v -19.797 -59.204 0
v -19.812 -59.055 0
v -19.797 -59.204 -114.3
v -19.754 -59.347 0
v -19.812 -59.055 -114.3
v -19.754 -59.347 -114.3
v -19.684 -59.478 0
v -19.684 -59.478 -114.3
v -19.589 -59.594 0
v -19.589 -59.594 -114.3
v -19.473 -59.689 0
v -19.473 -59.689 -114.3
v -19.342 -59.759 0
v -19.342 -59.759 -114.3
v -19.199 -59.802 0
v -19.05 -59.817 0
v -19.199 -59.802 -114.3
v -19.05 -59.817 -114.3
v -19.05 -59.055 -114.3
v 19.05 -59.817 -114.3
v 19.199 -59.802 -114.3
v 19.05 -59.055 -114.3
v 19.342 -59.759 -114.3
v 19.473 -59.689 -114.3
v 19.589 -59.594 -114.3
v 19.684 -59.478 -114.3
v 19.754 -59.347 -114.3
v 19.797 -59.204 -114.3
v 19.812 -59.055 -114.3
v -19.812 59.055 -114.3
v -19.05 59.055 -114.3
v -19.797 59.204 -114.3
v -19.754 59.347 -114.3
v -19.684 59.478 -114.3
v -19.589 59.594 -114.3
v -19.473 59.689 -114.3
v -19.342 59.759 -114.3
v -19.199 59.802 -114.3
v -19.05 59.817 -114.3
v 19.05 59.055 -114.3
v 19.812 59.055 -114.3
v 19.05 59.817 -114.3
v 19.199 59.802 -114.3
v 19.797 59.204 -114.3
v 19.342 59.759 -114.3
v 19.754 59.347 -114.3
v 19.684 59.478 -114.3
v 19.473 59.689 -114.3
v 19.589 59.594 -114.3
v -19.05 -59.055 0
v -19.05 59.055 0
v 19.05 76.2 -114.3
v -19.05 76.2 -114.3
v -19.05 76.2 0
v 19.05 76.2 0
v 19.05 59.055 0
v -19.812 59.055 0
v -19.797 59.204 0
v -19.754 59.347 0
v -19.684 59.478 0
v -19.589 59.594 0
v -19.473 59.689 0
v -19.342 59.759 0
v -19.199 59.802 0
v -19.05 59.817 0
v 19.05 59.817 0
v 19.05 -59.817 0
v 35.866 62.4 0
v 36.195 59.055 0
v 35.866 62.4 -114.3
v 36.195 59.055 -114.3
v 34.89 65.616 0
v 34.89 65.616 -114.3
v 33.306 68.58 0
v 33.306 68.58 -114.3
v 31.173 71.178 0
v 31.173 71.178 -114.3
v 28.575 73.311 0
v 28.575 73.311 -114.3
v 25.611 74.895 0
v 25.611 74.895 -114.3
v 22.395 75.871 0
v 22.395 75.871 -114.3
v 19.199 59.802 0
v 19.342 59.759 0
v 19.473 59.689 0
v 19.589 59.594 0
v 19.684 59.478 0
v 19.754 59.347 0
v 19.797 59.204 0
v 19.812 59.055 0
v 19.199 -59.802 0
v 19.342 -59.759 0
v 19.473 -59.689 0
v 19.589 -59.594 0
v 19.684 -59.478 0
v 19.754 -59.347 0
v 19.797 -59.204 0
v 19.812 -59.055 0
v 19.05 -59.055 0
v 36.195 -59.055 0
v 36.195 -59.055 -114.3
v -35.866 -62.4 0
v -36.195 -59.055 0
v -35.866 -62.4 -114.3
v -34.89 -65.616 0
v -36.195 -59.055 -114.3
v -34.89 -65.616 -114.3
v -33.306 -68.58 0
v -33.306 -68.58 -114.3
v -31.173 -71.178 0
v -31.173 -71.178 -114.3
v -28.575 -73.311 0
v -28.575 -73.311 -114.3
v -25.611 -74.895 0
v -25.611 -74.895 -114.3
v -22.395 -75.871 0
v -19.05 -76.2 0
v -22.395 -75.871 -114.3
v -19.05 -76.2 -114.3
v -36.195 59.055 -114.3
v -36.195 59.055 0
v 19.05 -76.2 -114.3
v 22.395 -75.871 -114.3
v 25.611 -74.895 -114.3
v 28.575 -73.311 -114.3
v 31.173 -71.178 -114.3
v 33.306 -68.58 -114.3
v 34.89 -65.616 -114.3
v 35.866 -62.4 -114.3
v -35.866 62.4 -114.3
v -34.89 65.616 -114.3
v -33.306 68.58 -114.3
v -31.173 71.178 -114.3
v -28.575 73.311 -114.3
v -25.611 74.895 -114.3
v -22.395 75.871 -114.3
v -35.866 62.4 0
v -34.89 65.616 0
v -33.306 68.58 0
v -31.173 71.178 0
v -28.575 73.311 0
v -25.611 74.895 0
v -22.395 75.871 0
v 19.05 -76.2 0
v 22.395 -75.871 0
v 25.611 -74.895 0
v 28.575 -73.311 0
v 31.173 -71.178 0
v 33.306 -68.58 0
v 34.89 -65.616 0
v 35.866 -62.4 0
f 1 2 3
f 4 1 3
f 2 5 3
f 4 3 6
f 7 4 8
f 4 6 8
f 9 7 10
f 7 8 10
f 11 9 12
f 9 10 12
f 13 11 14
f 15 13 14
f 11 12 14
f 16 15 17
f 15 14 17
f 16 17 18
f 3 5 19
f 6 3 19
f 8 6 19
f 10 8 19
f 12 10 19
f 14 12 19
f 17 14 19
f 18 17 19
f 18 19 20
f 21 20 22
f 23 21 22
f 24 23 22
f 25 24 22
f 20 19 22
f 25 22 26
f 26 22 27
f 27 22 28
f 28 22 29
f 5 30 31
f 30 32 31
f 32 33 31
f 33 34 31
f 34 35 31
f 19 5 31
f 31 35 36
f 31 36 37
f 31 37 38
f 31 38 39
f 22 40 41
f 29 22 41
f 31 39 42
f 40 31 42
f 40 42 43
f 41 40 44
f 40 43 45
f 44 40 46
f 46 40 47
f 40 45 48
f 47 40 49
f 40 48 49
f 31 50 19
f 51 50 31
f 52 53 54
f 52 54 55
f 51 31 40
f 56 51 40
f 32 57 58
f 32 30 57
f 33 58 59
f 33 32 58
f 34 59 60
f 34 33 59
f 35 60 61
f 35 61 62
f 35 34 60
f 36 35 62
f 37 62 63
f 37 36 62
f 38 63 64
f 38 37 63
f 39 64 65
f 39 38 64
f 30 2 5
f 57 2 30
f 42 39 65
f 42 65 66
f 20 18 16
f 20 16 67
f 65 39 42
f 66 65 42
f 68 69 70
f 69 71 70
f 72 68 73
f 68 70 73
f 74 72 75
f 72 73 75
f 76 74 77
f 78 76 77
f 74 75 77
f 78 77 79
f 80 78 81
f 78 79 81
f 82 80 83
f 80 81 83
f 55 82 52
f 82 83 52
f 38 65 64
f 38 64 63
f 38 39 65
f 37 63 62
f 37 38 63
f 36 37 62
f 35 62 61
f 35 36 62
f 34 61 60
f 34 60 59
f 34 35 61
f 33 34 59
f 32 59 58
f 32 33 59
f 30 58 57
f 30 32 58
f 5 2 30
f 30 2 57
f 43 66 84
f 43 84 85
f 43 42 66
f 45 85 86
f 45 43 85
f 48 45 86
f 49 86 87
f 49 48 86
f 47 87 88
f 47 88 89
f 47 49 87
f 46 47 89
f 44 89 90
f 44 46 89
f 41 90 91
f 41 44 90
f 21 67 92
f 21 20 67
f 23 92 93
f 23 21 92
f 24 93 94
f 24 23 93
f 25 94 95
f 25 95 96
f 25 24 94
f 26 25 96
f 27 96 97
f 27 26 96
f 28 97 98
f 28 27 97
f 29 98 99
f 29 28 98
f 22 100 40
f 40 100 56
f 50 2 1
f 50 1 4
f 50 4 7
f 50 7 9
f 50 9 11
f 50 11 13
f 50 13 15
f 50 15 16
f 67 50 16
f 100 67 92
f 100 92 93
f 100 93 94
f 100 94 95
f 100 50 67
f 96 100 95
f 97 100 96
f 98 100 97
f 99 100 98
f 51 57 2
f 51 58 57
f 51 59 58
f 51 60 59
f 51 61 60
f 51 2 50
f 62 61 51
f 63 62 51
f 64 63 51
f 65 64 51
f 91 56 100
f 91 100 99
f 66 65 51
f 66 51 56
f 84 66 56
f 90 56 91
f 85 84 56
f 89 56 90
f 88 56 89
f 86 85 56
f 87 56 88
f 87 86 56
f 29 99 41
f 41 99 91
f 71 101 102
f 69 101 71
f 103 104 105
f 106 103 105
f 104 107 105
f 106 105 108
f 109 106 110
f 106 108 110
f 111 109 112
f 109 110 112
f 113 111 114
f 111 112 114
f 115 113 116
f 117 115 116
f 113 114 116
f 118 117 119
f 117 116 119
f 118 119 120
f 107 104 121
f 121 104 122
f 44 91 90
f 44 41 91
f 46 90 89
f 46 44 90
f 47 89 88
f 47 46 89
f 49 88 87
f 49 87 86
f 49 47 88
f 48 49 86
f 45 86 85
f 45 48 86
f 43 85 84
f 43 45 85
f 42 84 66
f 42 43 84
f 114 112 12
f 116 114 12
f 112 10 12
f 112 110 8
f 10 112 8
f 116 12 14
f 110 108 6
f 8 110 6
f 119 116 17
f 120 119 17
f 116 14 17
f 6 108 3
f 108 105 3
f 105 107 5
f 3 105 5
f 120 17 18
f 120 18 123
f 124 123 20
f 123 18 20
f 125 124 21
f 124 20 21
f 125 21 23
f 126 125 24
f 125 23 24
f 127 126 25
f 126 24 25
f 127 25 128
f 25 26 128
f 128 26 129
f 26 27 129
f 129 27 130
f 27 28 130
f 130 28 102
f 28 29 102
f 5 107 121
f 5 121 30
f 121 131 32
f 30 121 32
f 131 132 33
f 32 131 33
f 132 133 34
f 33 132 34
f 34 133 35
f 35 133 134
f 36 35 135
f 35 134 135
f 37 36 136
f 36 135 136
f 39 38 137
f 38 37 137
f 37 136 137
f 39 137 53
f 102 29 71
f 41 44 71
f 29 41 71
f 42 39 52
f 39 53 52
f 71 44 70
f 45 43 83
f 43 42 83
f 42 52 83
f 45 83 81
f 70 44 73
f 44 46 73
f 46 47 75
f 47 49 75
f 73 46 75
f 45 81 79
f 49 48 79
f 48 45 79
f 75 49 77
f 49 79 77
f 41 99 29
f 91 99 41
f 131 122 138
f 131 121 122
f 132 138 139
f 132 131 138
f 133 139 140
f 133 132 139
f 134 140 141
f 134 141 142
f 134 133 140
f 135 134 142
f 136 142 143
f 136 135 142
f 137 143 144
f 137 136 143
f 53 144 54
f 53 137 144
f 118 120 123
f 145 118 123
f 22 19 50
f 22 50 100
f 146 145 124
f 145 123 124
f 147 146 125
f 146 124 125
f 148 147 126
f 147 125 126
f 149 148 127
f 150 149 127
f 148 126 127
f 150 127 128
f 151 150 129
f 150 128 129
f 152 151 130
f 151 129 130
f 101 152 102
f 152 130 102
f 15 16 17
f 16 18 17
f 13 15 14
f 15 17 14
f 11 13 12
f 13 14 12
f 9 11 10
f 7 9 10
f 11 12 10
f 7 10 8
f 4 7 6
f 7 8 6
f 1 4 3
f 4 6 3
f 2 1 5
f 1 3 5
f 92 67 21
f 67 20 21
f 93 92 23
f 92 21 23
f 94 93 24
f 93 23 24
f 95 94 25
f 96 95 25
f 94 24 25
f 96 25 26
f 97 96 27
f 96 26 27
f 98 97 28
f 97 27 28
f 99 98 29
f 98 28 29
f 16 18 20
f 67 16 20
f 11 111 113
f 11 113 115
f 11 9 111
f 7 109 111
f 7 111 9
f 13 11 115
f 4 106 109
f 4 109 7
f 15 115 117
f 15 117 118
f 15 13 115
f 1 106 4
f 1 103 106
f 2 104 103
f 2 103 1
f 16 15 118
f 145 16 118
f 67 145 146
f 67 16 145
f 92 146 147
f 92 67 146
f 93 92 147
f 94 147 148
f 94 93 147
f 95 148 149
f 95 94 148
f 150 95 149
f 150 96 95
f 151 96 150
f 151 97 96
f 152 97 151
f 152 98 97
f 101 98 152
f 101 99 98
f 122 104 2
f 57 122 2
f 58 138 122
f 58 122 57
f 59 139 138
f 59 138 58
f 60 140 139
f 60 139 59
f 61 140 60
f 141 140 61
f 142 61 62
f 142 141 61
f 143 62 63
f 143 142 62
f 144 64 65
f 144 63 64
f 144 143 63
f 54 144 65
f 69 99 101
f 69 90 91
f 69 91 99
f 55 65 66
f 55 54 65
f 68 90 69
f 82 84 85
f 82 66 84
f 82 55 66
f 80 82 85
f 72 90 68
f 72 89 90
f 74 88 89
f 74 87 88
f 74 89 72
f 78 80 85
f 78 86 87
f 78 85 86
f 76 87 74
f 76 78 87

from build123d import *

# Parameters (mm, degrees)
F4_W      = 72.39
F4_H      = 152.4
F5_DEPTH  = 114.3
F6_R      = 17.145
F7_W      = 39.624
F7_H      = 119.634
F8_DEPTH  = 114.3
F9_W      = 39.624
F9_H      = 119.634
F10_DEPTH = 114.3
F11_W     = 38.1
F11_H     = 118.11
F12_DEPTH = 114.3
F13_R     = 0.762
F14_R     = 0.762


with BuildPart() as f5:
    # F4 (on Top) → F5 (new body)
    with BuildSketch(Plane.XY):
        Rectangle(F4_W, F4_H)
    extrude(amount=-F5_DEPTH)

    # F6
    f6_edges = [f5.edges().sort_by_distance(p)[0] for p in [
        (-36.195, 76.2, -57.15),
        (36.195, 76.2, -57.15),
        (36.195, -76.2, -57.15),
        (-36.195, -76.2, -57.15),
    ]]
    fillet(f6_edges, radius=F6_R)

    # F7 (on face) → F8 (cut)
    with BuildSketch(Plane.XY):
        Rectangle(F7_W, F7_H)
    extrude(amount=-F8_DEPTH, mode=Mode.SUBTRACT)

    # F14
    f14_edges = [f5.edges().sort_by_distance(p)[0] for p in [
        (-19.812, 59.817, -57.15),
        (-19.812, -59.817, -57.15),
        (19.812, -59.817, -57.15),
        (19.812, 59.817, -57.15),
    ]]
    fillet(f14_edges, radius=F14_R)


with BuildPart() as f10:
    # F9 (on face) → F10 (new body)
    with BuildSketch(Plane.XY):
        Rectangle(F9_W, F9_H)
    extrude(amount=-F10_DEPTH)

    # F11 (on face) → F12 (cut)
    with BuildSketch(Plane.XY):
        Rectangle(F11_W, F11_H)
    extrude(amount=-F12_DEPTH, mode=Mode.SUBTRACT)

    # F13
    f13_edges = [f10.edges().sort_by_distance(p)[0] for p in [
        (-19.812, 59.817, -57.15),
        (19.812, 59.817, -57.15),
        (19.812, -59.817, -57.15),
        (-19.812, -59.817, -57.15),
    ]]
    fillet(f13_edges, radius=F13_R)


solid = Compound([f5.part, f10.part])
